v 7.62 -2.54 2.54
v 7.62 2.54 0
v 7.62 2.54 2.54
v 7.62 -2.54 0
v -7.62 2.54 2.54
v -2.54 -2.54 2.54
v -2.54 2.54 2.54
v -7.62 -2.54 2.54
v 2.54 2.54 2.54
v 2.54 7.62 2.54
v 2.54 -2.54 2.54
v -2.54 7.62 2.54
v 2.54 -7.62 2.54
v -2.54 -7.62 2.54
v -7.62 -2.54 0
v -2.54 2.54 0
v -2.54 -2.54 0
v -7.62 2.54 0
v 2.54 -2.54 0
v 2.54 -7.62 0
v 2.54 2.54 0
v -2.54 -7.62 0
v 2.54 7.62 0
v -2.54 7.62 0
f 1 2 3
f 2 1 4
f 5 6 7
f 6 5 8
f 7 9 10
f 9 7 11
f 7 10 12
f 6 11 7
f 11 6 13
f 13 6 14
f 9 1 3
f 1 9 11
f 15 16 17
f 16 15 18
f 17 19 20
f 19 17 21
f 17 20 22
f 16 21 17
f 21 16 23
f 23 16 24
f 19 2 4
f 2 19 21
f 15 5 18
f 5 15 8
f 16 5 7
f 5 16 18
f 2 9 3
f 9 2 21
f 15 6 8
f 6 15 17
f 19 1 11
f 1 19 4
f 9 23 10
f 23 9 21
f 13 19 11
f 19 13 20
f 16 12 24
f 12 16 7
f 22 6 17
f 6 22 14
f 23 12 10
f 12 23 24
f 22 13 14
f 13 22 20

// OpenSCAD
INCH = 25.4;

L = 0.6 * INCH;
W = 0.2 * INCH;
H = 0.1 * INCH;

translate([-L/2, -W/2, 0])
cube([L, W, H]);

translate([-W/2, -L/2, 0])
cube([W, L, H]);
